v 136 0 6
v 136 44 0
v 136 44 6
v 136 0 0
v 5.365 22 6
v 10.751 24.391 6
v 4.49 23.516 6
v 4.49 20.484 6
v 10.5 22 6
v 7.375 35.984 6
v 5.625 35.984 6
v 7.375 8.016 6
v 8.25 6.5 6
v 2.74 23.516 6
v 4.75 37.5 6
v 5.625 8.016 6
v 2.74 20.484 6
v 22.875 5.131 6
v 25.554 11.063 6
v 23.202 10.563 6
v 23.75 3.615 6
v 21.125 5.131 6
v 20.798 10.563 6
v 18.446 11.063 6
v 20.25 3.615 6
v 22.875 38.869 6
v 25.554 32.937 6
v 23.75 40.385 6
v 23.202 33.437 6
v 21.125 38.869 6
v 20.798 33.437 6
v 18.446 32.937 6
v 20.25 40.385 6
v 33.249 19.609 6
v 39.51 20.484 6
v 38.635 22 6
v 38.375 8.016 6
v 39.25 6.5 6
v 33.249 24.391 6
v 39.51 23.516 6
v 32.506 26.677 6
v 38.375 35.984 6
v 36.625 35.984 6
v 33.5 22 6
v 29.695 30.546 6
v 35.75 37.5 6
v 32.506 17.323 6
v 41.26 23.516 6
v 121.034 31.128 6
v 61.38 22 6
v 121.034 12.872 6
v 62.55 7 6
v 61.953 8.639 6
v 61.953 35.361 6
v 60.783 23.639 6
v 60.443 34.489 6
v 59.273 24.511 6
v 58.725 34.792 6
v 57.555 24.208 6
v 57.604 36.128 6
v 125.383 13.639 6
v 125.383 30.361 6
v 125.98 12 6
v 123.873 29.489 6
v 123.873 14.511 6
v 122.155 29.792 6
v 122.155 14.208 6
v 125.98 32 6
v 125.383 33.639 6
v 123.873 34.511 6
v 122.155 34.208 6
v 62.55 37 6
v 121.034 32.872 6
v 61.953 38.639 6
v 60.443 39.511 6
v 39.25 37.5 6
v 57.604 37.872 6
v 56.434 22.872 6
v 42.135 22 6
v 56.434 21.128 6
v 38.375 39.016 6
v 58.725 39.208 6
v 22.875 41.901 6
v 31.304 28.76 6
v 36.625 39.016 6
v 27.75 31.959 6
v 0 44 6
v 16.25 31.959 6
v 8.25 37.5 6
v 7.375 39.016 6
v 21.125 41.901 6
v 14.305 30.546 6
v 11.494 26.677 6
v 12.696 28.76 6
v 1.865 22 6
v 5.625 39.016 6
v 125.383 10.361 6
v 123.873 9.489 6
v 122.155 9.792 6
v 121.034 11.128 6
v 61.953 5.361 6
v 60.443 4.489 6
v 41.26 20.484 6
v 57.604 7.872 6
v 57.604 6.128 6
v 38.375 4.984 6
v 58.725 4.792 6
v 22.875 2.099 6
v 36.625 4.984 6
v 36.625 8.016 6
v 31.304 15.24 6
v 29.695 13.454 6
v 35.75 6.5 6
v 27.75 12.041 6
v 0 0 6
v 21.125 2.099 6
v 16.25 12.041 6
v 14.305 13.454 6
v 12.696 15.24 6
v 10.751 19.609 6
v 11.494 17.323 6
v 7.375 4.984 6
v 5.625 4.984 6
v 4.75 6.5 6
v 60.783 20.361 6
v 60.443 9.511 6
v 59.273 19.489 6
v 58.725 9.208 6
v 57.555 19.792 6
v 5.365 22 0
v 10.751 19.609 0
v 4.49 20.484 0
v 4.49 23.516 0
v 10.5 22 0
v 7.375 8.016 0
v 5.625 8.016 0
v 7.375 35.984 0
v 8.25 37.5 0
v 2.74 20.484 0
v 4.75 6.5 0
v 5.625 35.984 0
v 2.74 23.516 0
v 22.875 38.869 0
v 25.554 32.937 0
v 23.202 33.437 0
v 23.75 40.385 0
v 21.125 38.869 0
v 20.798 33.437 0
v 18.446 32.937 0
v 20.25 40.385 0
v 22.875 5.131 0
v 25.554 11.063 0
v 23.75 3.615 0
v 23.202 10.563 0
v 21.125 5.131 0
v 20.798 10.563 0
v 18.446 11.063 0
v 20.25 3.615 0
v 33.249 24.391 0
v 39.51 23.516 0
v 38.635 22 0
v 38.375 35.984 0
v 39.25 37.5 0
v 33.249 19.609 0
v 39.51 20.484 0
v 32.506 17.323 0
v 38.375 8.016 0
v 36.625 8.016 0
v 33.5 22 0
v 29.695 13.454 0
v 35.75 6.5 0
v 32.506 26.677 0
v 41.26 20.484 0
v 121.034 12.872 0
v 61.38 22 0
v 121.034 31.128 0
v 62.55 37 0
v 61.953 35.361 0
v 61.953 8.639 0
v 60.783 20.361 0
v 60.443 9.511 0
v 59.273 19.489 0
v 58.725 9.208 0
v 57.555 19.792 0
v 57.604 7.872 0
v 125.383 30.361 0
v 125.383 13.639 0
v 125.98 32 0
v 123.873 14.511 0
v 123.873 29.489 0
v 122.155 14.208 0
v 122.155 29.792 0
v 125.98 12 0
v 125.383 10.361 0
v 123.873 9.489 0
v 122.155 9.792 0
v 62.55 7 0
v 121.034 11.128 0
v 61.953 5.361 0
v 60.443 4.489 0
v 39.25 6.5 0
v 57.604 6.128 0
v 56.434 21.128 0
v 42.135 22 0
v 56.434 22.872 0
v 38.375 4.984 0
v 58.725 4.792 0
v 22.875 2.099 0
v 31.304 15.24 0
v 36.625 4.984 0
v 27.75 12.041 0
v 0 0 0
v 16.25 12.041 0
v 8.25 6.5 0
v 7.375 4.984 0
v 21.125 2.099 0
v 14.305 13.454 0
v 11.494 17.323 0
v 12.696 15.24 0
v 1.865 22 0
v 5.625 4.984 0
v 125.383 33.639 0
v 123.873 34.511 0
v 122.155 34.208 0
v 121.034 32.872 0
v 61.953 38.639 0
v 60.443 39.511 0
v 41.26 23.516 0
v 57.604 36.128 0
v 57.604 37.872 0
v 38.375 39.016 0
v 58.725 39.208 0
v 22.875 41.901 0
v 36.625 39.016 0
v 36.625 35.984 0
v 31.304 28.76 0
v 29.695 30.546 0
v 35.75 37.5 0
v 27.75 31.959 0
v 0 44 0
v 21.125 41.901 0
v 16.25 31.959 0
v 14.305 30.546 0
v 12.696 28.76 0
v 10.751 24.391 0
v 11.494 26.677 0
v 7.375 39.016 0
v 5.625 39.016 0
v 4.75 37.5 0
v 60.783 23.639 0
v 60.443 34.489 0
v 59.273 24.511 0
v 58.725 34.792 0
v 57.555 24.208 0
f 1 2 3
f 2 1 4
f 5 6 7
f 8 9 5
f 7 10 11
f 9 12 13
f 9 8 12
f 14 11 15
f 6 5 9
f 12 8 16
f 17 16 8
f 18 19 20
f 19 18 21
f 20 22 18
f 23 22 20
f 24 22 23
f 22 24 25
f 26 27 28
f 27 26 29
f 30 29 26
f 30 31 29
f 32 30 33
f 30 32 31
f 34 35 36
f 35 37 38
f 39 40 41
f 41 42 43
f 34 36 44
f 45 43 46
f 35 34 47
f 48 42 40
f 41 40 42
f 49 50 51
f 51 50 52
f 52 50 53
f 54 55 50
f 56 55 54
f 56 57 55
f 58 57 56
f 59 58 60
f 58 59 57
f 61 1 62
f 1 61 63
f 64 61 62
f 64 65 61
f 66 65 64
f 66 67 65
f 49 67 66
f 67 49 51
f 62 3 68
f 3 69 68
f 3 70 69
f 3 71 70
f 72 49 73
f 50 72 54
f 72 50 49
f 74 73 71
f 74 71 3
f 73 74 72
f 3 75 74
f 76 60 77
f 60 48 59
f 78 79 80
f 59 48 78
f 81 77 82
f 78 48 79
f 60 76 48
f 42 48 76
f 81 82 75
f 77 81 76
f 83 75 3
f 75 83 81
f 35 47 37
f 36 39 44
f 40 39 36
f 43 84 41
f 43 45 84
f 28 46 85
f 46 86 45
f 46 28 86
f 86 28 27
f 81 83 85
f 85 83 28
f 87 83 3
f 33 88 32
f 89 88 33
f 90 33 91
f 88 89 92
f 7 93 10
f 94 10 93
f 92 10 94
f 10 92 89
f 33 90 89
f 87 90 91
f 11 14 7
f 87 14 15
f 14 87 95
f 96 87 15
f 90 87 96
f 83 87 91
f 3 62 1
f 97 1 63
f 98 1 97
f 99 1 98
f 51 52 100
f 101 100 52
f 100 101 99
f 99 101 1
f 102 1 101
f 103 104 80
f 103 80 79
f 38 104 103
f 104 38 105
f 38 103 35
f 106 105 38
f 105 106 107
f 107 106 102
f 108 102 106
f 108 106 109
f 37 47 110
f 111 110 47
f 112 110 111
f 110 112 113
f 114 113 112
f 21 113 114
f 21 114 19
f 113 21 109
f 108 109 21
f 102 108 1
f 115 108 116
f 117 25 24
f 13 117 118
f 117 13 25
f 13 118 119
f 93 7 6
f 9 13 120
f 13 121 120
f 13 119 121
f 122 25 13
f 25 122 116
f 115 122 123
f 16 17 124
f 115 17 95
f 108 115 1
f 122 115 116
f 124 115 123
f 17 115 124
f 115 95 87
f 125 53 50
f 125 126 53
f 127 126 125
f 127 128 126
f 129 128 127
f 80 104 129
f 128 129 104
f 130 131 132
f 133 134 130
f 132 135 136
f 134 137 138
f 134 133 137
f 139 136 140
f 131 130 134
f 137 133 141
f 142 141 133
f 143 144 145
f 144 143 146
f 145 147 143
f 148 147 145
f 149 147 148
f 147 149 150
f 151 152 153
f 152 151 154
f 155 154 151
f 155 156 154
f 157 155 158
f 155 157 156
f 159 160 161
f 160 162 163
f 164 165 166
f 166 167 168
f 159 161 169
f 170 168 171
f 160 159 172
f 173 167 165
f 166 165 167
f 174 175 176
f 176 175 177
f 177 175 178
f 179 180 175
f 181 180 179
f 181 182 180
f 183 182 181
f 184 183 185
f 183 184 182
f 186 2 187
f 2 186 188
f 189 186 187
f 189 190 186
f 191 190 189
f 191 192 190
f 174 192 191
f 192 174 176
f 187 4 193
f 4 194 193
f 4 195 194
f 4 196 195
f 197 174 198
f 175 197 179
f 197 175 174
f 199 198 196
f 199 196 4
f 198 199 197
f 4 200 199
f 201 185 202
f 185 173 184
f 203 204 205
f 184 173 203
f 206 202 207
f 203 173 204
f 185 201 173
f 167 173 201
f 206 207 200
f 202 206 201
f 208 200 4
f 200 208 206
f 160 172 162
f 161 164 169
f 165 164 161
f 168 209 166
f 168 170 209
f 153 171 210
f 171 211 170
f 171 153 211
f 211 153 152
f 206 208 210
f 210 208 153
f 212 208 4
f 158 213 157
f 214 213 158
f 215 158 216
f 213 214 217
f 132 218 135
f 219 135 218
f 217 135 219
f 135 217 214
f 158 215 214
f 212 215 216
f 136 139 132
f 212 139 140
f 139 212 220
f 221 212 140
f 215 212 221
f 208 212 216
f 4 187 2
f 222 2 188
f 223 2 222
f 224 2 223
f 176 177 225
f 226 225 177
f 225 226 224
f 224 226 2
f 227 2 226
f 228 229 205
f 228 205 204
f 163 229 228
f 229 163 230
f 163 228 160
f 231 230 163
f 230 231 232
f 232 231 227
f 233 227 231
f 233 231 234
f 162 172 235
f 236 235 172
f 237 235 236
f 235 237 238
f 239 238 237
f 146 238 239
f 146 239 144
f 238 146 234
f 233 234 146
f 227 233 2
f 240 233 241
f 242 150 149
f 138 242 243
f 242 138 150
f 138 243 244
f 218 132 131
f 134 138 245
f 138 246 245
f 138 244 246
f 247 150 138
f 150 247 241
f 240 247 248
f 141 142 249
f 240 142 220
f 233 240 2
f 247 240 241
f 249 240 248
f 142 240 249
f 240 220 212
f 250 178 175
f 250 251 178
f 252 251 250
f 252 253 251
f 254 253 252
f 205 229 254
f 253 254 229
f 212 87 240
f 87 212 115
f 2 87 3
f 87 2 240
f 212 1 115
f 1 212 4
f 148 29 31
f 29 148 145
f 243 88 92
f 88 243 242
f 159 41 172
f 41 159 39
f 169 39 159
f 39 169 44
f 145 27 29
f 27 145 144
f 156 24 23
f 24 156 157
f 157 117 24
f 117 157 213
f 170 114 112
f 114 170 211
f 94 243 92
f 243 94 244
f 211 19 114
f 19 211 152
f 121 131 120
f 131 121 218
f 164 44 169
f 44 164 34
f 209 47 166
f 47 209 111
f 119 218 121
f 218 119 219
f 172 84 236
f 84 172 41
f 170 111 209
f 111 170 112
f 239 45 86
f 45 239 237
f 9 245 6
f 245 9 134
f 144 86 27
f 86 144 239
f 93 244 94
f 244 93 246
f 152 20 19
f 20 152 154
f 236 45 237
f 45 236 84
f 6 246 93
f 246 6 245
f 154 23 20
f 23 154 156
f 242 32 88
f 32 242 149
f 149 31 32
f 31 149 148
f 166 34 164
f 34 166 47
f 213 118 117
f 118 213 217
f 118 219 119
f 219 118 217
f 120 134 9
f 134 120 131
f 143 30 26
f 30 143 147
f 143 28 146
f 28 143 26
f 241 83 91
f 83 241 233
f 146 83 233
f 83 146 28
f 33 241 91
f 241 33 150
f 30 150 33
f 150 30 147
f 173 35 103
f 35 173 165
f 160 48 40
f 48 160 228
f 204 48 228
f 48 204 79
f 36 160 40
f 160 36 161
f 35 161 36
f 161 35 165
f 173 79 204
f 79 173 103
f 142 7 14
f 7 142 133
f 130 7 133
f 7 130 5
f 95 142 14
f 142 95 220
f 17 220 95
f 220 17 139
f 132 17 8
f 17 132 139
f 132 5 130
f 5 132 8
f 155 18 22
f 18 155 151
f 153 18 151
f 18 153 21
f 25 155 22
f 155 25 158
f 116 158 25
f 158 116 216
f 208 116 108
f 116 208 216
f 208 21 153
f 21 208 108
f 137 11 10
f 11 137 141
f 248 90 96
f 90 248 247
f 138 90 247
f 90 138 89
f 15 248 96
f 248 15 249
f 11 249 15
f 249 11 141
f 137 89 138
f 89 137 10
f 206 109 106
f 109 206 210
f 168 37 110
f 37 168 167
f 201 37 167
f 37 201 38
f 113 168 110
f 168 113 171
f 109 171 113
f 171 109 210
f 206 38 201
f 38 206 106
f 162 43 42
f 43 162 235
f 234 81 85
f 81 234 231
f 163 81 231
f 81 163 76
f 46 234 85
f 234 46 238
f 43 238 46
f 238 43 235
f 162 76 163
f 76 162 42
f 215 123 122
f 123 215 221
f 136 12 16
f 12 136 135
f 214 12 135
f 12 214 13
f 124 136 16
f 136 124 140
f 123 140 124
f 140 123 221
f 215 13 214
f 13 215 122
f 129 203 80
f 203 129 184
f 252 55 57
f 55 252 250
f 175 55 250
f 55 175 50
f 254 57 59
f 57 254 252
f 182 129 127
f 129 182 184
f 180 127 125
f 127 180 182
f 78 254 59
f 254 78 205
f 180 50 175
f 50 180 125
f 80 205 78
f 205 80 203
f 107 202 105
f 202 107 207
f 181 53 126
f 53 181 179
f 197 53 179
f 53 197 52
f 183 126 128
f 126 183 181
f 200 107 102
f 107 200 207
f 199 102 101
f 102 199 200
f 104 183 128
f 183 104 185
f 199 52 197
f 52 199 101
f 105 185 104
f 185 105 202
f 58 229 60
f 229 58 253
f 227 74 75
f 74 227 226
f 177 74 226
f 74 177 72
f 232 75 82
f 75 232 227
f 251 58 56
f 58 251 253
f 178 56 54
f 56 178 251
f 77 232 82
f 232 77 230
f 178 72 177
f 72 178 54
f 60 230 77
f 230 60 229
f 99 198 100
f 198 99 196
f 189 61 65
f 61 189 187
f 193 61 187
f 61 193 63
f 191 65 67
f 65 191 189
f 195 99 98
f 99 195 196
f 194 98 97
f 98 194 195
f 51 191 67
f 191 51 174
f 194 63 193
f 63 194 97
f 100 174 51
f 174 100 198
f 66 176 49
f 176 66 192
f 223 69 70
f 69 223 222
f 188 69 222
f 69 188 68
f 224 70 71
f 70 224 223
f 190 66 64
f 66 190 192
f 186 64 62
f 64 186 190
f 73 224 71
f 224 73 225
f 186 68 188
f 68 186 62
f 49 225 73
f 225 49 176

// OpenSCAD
length=136;
width=44;
thickness=6;

small_radius=1.75;
large_radius=2.55;
cutout_radius=11.5;

difference(){
	cube(size=[length,width,thickness], center=false);


		// Motor cutout
		translate(v=[22,22,0])
		cylinder(h=thickness, r=cutout_radius, center=false);

	// Motor mount holes
	
		// NEMA 14 mount
		translate(v=[22,40.385,0])
		cylinder(h=thickness, r=small_radius, center=false);

		translate(v=[40.385,22,0])
		cylinder(h=thickness, r=small_radius, center=false);

		translate(v=[3.615,22,0])
		cylinder(h=thickness, r=small_radius, center=false);

		translate(v=[22,3.615,0])
		cylinder(h=thickness, r=small_radius, center=false);


		// NEMA 17 mount
		translate(v=[6.5,37.5,0])
		cylinder(h=thickness, r=small_radius, center=false);

		translate(v=[37.5,6.5,0])
		cylinder(h=thickness, r=small_radius, center=false);

		translate(v=[37.5,37.5,0])
		cylinder(h=thickness, r=small_radius, center=false);

		translate(v=[6.5,6.5,0])
		cylinder(h=thickness, r=small_radius, center=false);



	// Standard plate mount holes
		translate(v=[58.83,22,0])
		cylinder(h=thickness, r=large_radius, center=false);

		translate(v=[60,7,0])
		cylinder(h=thickness, r=large_radius, center=false);

		translate(v=[60,37,0])
		cylinder(h=thickness, r=large_radius, center=false);

		translate(v=[123.43,12,0])
		cylinder(h=thickness, r=large_radius, center=false);

		translate(v=[123.43,32,0])
		cylinder(h=thickness, r=large_radius, center=false);



}
